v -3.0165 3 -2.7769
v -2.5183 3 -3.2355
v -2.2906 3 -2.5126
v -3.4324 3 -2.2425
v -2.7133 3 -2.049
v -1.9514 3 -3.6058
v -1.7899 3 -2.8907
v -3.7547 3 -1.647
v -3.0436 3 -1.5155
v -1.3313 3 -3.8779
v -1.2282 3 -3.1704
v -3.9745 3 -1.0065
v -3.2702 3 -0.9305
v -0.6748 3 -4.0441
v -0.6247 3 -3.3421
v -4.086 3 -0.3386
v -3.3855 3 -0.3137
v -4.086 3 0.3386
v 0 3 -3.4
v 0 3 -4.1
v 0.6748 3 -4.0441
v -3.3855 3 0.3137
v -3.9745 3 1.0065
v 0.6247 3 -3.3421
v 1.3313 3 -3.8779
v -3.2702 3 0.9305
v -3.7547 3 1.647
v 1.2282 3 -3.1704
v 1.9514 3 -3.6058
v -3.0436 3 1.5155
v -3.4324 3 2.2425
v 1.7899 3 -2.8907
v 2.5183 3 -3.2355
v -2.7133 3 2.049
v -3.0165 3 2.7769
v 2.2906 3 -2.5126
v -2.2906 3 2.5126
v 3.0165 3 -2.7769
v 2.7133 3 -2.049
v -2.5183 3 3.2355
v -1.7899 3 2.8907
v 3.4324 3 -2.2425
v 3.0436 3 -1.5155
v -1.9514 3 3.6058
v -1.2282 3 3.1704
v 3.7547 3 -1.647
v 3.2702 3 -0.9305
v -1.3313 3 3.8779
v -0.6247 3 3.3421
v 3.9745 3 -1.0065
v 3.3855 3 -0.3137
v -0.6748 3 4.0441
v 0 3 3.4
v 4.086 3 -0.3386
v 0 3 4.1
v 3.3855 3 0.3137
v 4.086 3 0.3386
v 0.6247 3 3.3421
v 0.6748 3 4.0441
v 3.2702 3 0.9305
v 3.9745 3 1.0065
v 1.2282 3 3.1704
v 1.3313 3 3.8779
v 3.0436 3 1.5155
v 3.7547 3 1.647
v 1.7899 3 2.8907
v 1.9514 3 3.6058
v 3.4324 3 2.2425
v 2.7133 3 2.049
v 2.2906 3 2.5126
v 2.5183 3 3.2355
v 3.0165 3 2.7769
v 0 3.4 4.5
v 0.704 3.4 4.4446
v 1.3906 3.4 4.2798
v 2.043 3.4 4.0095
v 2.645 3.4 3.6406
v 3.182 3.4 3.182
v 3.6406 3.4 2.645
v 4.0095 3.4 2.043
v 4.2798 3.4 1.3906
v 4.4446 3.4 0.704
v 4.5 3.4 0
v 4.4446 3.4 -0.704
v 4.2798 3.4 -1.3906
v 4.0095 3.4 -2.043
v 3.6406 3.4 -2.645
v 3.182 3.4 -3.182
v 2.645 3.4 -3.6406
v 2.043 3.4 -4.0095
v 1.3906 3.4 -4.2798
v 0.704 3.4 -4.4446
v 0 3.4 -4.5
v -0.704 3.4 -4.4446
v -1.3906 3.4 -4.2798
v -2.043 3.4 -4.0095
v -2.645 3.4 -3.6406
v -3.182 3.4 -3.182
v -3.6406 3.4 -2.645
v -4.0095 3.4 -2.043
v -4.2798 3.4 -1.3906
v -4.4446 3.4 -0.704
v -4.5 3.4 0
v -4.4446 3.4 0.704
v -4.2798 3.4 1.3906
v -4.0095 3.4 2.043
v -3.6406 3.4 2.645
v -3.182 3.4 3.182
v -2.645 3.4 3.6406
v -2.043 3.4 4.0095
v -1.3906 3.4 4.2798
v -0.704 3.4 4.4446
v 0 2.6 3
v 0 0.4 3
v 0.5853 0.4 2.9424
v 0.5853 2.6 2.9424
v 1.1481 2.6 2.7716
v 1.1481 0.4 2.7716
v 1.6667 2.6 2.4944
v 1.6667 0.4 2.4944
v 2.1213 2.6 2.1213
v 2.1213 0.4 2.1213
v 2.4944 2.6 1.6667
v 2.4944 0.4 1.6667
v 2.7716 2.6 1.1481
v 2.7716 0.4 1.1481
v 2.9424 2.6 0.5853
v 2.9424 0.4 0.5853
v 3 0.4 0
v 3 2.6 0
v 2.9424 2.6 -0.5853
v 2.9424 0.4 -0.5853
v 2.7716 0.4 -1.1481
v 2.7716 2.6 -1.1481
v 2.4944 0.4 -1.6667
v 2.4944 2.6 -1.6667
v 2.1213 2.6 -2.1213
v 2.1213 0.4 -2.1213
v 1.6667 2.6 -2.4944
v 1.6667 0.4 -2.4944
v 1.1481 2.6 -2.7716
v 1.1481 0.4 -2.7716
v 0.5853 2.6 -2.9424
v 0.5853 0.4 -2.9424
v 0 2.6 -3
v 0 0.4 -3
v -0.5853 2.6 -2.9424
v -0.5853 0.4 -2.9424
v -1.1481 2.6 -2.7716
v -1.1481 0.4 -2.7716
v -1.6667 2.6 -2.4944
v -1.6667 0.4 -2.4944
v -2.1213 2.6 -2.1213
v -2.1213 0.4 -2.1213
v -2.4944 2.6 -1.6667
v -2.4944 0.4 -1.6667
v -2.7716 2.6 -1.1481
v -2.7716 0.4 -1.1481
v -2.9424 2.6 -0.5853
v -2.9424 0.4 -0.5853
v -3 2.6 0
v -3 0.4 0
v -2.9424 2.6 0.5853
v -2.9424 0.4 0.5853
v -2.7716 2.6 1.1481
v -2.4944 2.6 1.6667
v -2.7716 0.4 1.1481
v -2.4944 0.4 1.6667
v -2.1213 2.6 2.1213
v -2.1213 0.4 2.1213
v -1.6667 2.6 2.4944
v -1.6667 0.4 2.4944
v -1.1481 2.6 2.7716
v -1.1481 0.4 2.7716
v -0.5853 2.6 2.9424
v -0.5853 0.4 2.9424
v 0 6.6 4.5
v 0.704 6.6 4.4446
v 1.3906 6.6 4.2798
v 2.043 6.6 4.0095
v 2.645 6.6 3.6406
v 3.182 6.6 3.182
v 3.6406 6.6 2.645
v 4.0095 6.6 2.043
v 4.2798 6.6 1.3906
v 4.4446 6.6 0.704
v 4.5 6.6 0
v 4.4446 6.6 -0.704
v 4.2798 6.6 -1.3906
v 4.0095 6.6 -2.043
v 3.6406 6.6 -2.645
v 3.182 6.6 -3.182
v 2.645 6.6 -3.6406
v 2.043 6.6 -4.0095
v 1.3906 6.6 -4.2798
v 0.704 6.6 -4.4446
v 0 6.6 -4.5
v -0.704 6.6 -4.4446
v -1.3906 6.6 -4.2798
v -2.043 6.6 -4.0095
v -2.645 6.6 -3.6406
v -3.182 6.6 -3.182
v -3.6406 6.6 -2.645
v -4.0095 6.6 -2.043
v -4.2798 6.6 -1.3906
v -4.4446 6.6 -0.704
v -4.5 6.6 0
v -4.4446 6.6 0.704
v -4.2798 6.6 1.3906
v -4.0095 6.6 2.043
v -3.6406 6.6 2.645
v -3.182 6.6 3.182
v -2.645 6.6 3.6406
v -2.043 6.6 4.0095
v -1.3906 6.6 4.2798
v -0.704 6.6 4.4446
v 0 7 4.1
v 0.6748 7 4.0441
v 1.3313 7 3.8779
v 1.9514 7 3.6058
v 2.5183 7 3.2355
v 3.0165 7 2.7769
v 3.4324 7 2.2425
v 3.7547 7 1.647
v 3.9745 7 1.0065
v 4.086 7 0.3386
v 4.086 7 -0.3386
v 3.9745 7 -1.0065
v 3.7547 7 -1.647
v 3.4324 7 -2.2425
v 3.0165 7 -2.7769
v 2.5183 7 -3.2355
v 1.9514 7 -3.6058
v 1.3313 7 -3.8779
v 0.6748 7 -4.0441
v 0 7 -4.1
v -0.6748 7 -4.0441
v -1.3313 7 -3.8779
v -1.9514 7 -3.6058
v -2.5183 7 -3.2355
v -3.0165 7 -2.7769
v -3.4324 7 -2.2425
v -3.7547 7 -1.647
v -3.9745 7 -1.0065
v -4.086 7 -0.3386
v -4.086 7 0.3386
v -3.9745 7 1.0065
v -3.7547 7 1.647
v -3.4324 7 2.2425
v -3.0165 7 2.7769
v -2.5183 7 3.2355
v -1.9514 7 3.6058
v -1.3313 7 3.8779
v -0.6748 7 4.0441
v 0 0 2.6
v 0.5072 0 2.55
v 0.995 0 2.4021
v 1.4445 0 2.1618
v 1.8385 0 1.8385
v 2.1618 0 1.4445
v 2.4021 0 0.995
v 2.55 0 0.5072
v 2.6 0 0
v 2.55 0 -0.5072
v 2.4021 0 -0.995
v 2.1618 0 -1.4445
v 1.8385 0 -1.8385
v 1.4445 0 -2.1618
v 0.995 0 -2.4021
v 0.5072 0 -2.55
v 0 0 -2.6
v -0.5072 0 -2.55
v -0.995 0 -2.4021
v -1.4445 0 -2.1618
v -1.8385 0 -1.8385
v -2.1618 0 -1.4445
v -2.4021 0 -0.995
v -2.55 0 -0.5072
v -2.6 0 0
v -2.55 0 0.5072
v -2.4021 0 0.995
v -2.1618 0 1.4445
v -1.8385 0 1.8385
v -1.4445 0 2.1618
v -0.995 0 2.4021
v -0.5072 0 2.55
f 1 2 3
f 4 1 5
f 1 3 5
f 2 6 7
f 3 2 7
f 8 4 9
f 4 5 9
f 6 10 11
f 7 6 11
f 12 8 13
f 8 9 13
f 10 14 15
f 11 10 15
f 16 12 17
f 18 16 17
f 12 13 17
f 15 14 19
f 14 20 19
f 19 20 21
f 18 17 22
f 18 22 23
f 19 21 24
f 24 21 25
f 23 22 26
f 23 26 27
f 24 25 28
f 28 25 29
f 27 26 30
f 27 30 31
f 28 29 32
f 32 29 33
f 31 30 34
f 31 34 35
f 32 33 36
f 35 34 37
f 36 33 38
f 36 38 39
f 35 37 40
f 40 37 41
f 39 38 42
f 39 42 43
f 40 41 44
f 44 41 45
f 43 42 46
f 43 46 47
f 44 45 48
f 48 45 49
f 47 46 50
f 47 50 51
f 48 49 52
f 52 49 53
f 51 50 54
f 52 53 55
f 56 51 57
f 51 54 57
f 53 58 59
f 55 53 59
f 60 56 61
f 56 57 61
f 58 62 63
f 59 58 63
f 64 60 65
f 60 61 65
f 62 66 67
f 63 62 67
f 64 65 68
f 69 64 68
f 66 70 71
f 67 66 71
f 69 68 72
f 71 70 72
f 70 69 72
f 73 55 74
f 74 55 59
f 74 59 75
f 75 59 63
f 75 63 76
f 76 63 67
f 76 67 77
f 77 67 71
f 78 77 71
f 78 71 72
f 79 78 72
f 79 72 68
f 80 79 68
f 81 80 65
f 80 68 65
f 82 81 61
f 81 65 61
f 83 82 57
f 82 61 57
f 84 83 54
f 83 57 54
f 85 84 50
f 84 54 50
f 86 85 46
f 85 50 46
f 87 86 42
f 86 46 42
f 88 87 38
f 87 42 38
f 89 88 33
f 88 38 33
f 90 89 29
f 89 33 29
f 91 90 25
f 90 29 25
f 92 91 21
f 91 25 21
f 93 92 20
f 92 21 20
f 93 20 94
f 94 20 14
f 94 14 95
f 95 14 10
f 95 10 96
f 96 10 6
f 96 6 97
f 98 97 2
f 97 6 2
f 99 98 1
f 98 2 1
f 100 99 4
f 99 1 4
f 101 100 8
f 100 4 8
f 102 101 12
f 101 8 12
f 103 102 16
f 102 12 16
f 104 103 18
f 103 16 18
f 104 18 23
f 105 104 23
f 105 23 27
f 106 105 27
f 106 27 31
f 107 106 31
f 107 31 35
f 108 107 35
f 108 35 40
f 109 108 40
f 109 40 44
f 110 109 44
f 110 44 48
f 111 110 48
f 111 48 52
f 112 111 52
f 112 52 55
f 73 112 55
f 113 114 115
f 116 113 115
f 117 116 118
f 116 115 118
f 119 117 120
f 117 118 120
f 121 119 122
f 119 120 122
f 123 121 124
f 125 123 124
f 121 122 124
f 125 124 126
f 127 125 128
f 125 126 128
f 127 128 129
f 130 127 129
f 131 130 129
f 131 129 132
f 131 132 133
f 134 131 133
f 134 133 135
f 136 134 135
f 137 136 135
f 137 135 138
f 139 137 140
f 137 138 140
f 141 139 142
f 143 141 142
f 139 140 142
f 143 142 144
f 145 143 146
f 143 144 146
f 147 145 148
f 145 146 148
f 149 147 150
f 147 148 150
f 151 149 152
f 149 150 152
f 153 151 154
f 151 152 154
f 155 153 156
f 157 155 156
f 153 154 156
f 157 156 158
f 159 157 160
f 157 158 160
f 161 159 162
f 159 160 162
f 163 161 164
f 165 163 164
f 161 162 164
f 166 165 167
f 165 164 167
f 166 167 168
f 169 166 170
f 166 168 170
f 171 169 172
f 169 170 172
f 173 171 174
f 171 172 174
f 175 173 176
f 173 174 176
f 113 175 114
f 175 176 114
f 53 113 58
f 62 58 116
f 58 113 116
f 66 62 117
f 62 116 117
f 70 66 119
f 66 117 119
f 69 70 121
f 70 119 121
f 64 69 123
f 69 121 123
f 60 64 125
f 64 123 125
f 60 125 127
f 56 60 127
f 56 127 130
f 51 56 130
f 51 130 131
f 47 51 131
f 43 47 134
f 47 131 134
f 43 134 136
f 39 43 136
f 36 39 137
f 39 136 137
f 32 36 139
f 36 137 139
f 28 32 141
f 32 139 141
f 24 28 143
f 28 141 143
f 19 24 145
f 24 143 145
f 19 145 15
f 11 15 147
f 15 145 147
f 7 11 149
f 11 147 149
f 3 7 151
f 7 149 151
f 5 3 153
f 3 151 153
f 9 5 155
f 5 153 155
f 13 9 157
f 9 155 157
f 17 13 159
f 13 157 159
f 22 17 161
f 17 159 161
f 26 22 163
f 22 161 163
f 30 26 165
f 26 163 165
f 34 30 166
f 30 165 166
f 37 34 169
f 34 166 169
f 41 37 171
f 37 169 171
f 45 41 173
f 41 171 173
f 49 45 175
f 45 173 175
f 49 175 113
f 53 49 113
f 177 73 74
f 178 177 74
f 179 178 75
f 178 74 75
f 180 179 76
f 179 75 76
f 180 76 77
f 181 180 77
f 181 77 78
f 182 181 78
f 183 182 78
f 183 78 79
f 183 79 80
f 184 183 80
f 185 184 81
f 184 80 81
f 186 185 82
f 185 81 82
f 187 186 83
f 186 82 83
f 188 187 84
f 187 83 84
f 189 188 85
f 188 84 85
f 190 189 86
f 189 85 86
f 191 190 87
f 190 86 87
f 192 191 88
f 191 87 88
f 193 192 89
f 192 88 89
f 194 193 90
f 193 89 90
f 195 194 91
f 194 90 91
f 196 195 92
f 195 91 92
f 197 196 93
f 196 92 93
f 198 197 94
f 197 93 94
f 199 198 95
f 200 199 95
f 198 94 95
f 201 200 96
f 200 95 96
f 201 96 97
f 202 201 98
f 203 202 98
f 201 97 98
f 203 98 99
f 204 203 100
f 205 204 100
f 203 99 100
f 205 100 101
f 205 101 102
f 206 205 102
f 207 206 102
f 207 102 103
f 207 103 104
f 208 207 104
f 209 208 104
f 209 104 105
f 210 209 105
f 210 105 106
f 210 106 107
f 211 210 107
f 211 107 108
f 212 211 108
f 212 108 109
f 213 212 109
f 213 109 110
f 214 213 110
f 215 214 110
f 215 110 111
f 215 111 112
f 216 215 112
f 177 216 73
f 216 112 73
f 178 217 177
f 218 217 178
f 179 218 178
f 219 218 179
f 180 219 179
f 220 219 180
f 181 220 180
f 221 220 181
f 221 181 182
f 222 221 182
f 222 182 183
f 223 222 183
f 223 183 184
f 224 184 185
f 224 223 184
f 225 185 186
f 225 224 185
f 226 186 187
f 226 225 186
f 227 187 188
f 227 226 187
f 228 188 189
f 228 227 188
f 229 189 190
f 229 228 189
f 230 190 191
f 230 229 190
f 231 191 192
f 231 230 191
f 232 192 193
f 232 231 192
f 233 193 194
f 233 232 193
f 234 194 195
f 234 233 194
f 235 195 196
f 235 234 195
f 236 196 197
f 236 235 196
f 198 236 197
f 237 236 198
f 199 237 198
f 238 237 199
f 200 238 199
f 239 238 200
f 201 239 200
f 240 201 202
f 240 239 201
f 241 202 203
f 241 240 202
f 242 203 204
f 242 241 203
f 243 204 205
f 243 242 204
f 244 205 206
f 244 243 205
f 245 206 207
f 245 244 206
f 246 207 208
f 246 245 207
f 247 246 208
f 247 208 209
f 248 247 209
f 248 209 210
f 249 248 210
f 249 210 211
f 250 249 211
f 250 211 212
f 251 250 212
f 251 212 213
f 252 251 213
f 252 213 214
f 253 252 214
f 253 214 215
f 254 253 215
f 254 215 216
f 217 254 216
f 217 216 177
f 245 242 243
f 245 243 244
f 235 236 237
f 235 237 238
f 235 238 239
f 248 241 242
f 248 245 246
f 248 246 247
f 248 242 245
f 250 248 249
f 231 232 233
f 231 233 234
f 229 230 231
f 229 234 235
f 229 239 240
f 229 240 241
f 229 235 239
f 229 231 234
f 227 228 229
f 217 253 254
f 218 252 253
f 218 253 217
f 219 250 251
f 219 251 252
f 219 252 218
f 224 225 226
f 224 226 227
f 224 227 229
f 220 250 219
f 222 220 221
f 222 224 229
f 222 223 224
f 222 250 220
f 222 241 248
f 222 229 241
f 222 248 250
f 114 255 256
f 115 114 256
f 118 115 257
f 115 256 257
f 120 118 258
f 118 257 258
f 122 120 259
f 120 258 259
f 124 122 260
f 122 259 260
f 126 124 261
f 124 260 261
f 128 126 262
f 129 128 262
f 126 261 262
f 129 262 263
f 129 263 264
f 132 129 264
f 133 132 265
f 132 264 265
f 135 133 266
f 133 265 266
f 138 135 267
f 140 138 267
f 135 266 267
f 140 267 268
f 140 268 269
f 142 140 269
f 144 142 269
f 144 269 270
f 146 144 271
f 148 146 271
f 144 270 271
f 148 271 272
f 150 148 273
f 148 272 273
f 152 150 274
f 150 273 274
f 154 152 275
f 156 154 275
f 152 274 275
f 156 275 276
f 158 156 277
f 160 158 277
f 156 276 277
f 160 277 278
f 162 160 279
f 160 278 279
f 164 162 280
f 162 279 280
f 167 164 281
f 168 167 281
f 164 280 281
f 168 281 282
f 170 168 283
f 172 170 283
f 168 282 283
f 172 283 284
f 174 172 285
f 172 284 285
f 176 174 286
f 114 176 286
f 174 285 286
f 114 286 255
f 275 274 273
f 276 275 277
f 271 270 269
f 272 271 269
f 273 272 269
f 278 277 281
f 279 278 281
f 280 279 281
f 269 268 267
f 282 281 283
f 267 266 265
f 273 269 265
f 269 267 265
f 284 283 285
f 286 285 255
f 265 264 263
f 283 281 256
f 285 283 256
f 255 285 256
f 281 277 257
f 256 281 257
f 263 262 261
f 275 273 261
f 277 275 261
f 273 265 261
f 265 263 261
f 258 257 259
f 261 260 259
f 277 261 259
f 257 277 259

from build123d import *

# Parameters (mm, degrees)
SKETCH_1_R      = 3
EXTRUDE_1_DEPTH = 3
SKETCH_2_R      = 4.5
EXTRUDE_2_DEPTH = 4
CHAMFER_1_SIZE  = 0.4


with BuildPart() as part:
    # 草图1 → 凸台-拉伸1 (new body)
    with BuildSketch(Plane(origin=(0, 0, 0), x_dir=(1, 0, 0), z_dir=(0, 1, 0))):
        with Locations(Location((0, 0, 0), (0, 0, 270))):
            Circle(SKETCH_1_R)
    extrude(amount=EXTRUDE_1_DEPTH)

    # 草图2 → 凸台-拉伸2 (add)
    with BuildSketch(Plane(origin=(0, 3, 0), x_dir=(1, 0, 0), z_dir=(0, 1, 0))):
        with Locations(Location((0, 0, 0), (0, 0, 270))):
            Circle(SKETCH_2_R)
    extrude(amount=EXTRUDE_2_DEPTH)

    # 倒角1
    chamfer_1_edges = [part.edges().sort_by_distance(p)[0] for p in [
        (0, 0, -3),
        (0, 3, -3),
        (0, 3, -4.5),
        (0, 7, -4.5),
    ]]
    chamfer(chamfer_1_edges, length=CHAMFER_1_SIZE)


solid = part.part
